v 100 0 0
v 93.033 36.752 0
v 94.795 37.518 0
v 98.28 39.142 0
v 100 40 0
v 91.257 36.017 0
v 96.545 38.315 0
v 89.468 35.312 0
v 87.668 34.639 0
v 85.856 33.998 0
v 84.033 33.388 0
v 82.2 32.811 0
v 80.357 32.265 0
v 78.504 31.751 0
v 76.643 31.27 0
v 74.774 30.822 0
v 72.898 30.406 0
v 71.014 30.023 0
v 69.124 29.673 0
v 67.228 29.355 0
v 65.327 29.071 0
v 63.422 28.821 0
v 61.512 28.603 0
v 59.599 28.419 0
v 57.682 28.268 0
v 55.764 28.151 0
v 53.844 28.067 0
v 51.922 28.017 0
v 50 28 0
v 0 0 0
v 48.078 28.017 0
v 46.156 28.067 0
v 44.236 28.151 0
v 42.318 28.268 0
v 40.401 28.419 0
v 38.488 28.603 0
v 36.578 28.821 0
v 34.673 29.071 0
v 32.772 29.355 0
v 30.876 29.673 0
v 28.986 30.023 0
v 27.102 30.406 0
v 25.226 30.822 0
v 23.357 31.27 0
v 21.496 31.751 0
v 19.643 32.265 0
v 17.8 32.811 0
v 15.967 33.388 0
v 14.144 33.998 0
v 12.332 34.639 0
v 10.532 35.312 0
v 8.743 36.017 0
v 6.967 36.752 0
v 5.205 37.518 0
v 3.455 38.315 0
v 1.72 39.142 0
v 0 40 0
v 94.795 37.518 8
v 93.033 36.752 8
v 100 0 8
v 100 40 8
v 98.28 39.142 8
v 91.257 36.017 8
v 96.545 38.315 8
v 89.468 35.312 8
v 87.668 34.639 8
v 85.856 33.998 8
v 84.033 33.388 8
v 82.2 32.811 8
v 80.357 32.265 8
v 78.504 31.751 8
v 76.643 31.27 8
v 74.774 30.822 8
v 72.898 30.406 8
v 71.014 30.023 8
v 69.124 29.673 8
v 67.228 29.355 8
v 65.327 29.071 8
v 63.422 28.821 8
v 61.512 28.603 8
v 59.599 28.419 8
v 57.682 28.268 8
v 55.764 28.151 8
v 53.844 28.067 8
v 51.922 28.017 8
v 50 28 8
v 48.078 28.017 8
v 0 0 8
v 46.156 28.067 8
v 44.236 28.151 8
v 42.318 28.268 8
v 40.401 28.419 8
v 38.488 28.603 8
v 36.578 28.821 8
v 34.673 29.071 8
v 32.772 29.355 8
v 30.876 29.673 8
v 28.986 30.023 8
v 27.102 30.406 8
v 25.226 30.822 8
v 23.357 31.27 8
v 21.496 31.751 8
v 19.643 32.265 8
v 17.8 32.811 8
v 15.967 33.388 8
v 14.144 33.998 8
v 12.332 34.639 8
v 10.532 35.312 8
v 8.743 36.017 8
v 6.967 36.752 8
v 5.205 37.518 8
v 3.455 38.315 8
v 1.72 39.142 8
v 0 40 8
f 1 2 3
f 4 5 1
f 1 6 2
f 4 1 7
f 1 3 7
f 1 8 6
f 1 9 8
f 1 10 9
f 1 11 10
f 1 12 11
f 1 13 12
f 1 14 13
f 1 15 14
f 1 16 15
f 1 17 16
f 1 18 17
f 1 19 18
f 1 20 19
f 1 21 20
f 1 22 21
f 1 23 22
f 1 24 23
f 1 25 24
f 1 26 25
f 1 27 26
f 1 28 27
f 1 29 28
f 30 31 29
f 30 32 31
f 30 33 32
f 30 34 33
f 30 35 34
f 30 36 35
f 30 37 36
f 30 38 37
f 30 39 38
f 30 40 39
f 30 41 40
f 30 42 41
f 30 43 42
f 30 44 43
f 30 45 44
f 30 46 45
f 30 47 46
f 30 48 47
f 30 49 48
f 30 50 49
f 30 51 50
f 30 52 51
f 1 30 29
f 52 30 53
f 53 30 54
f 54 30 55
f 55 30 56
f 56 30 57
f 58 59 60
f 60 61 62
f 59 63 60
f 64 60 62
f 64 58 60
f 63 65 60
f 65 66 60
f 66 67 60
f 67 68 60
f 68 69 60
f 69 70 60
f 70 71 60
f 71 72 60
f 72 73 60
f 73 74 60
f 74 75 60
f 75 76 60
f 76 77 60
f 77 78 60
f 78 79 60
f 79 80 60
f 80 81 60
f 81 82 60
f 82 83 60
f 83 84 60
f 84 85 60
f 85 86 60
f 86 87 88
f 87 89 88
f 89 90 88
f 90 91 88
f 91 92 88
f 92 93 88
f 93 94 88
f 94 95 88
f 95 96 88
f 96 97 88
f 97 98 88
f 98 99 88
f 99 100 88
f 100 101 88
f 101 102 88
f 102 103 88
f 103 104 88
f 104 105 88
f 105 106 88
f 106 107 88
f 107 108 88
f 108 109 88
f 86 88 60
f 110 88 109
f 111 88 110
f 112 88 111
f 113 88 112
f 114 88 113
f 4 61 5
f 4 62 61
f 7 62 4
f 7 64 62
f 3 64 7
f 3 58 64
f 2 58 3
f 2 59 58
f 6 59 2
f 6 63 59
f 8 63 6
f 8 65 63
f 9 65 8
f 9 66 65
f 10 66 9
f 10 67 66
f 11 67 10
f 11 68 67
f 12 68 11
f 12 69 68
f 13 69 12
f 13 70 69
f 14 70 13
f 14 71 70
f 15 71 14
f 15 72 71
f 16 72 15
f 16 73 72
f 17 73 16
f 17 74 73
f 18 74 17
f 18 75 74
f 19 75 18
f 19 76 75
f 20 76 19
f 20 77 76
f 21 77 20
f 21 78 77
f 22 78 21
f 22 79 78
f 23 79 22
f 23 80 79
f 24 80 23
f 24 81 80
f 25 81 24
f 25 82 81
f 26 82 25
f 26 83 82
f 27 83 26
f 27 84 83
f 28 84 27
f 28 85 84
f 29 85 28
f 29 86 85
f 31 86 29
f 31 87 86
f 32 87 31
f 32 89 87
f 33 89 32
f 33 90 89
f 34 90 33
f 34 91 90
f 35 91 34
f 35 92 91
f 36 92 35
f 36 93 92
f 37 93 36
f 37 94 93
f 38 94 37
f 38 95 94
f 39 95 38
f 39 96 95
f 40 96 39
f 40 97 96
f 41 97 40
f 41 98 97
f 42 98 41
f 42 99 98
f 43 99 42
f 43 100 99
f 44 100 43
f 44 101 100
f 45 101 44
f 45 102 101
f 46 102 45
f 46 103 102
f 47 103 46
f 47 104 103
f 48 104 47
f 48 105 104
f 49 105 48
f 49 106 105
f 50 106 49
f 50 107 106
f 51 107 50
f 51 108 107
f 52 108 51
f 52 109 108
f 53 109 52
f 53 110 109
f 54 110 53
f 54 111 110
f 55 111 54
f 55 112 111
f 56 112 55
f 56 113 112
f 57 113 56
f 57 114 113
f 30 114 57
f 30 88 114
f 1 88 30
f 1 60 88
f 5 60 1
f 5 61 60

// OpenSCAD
$fn = 32;

// ----------------------------------------------------------------------
// Arc profile plate: notch, 57 points
// ----------------------------------------------------------------------

// --- parameters (mm) ---
bar_l = 100;              // bar length, X
bar_w = 40;               // bar width, Y
notch_depth = 12;         // depth of the arc notch at mid-span
arc_r = 110.17;           // radius of the notch arc
arc_angle = 53.98;        // notch arc angle, degrees
arc_step = 1;             // sampling step of the notch arc, degrees
plate_t = 8;              // plate thickness, Z

profile = [[0, 0], [100, 0], [100, 40], [98.28, 39.142], [96.545, 38.315], [94.795, 37.518], [93.033, 36.752], [91.257, 36.017], [89.468, 35.312], [87.668, 34.639], [85.856, 33.998], [84.033, 33.388], [82.2, 32.811], [80.357, 32.265], [78.504, 31.751], [76.643, 31.27], [74.774, 30.822], [72.898, 30.406], [71.014, 30.023], [69.124, 29.673], [67.228, 29.355], [65.327, 29.071], [63.422, 28.821], [61.512, 28.603], [59.599, 28.419], [57.682, 28.268], [55.764, 28.151], [53.844, 28.067], [51.922, 28.017], [50, 28], [48.078, 28.017], [46.156, 28.067], [44.236, 28.151], [42.318, 28.268], [40.401, 28.419], [38.488, 28.603], [36.578, 28.821], [34.673, 29.071], [32.772, 29.355], [30.876, 29.673], [28.986, 30.023], [27.102, 30.406], [25.226, 30.822], [23.357, 31.27], [21.496, 31.751], [19.643, 32.265], [17.8, 32.811], [15.967, 33.388], [14.144, 33.998], [12.332, 34.639], [10.532, 35.312], [8.743, 36.017], [6.967, 36.752], [5.205, 37.518], [3.455, 38.315], [1.72, 39.142], [0, 40]];  // primary outline, 57 points, counter clockwise

// --- the one profile operation ---
linear_extrude(height = plate_t) polygon(points = profile);
